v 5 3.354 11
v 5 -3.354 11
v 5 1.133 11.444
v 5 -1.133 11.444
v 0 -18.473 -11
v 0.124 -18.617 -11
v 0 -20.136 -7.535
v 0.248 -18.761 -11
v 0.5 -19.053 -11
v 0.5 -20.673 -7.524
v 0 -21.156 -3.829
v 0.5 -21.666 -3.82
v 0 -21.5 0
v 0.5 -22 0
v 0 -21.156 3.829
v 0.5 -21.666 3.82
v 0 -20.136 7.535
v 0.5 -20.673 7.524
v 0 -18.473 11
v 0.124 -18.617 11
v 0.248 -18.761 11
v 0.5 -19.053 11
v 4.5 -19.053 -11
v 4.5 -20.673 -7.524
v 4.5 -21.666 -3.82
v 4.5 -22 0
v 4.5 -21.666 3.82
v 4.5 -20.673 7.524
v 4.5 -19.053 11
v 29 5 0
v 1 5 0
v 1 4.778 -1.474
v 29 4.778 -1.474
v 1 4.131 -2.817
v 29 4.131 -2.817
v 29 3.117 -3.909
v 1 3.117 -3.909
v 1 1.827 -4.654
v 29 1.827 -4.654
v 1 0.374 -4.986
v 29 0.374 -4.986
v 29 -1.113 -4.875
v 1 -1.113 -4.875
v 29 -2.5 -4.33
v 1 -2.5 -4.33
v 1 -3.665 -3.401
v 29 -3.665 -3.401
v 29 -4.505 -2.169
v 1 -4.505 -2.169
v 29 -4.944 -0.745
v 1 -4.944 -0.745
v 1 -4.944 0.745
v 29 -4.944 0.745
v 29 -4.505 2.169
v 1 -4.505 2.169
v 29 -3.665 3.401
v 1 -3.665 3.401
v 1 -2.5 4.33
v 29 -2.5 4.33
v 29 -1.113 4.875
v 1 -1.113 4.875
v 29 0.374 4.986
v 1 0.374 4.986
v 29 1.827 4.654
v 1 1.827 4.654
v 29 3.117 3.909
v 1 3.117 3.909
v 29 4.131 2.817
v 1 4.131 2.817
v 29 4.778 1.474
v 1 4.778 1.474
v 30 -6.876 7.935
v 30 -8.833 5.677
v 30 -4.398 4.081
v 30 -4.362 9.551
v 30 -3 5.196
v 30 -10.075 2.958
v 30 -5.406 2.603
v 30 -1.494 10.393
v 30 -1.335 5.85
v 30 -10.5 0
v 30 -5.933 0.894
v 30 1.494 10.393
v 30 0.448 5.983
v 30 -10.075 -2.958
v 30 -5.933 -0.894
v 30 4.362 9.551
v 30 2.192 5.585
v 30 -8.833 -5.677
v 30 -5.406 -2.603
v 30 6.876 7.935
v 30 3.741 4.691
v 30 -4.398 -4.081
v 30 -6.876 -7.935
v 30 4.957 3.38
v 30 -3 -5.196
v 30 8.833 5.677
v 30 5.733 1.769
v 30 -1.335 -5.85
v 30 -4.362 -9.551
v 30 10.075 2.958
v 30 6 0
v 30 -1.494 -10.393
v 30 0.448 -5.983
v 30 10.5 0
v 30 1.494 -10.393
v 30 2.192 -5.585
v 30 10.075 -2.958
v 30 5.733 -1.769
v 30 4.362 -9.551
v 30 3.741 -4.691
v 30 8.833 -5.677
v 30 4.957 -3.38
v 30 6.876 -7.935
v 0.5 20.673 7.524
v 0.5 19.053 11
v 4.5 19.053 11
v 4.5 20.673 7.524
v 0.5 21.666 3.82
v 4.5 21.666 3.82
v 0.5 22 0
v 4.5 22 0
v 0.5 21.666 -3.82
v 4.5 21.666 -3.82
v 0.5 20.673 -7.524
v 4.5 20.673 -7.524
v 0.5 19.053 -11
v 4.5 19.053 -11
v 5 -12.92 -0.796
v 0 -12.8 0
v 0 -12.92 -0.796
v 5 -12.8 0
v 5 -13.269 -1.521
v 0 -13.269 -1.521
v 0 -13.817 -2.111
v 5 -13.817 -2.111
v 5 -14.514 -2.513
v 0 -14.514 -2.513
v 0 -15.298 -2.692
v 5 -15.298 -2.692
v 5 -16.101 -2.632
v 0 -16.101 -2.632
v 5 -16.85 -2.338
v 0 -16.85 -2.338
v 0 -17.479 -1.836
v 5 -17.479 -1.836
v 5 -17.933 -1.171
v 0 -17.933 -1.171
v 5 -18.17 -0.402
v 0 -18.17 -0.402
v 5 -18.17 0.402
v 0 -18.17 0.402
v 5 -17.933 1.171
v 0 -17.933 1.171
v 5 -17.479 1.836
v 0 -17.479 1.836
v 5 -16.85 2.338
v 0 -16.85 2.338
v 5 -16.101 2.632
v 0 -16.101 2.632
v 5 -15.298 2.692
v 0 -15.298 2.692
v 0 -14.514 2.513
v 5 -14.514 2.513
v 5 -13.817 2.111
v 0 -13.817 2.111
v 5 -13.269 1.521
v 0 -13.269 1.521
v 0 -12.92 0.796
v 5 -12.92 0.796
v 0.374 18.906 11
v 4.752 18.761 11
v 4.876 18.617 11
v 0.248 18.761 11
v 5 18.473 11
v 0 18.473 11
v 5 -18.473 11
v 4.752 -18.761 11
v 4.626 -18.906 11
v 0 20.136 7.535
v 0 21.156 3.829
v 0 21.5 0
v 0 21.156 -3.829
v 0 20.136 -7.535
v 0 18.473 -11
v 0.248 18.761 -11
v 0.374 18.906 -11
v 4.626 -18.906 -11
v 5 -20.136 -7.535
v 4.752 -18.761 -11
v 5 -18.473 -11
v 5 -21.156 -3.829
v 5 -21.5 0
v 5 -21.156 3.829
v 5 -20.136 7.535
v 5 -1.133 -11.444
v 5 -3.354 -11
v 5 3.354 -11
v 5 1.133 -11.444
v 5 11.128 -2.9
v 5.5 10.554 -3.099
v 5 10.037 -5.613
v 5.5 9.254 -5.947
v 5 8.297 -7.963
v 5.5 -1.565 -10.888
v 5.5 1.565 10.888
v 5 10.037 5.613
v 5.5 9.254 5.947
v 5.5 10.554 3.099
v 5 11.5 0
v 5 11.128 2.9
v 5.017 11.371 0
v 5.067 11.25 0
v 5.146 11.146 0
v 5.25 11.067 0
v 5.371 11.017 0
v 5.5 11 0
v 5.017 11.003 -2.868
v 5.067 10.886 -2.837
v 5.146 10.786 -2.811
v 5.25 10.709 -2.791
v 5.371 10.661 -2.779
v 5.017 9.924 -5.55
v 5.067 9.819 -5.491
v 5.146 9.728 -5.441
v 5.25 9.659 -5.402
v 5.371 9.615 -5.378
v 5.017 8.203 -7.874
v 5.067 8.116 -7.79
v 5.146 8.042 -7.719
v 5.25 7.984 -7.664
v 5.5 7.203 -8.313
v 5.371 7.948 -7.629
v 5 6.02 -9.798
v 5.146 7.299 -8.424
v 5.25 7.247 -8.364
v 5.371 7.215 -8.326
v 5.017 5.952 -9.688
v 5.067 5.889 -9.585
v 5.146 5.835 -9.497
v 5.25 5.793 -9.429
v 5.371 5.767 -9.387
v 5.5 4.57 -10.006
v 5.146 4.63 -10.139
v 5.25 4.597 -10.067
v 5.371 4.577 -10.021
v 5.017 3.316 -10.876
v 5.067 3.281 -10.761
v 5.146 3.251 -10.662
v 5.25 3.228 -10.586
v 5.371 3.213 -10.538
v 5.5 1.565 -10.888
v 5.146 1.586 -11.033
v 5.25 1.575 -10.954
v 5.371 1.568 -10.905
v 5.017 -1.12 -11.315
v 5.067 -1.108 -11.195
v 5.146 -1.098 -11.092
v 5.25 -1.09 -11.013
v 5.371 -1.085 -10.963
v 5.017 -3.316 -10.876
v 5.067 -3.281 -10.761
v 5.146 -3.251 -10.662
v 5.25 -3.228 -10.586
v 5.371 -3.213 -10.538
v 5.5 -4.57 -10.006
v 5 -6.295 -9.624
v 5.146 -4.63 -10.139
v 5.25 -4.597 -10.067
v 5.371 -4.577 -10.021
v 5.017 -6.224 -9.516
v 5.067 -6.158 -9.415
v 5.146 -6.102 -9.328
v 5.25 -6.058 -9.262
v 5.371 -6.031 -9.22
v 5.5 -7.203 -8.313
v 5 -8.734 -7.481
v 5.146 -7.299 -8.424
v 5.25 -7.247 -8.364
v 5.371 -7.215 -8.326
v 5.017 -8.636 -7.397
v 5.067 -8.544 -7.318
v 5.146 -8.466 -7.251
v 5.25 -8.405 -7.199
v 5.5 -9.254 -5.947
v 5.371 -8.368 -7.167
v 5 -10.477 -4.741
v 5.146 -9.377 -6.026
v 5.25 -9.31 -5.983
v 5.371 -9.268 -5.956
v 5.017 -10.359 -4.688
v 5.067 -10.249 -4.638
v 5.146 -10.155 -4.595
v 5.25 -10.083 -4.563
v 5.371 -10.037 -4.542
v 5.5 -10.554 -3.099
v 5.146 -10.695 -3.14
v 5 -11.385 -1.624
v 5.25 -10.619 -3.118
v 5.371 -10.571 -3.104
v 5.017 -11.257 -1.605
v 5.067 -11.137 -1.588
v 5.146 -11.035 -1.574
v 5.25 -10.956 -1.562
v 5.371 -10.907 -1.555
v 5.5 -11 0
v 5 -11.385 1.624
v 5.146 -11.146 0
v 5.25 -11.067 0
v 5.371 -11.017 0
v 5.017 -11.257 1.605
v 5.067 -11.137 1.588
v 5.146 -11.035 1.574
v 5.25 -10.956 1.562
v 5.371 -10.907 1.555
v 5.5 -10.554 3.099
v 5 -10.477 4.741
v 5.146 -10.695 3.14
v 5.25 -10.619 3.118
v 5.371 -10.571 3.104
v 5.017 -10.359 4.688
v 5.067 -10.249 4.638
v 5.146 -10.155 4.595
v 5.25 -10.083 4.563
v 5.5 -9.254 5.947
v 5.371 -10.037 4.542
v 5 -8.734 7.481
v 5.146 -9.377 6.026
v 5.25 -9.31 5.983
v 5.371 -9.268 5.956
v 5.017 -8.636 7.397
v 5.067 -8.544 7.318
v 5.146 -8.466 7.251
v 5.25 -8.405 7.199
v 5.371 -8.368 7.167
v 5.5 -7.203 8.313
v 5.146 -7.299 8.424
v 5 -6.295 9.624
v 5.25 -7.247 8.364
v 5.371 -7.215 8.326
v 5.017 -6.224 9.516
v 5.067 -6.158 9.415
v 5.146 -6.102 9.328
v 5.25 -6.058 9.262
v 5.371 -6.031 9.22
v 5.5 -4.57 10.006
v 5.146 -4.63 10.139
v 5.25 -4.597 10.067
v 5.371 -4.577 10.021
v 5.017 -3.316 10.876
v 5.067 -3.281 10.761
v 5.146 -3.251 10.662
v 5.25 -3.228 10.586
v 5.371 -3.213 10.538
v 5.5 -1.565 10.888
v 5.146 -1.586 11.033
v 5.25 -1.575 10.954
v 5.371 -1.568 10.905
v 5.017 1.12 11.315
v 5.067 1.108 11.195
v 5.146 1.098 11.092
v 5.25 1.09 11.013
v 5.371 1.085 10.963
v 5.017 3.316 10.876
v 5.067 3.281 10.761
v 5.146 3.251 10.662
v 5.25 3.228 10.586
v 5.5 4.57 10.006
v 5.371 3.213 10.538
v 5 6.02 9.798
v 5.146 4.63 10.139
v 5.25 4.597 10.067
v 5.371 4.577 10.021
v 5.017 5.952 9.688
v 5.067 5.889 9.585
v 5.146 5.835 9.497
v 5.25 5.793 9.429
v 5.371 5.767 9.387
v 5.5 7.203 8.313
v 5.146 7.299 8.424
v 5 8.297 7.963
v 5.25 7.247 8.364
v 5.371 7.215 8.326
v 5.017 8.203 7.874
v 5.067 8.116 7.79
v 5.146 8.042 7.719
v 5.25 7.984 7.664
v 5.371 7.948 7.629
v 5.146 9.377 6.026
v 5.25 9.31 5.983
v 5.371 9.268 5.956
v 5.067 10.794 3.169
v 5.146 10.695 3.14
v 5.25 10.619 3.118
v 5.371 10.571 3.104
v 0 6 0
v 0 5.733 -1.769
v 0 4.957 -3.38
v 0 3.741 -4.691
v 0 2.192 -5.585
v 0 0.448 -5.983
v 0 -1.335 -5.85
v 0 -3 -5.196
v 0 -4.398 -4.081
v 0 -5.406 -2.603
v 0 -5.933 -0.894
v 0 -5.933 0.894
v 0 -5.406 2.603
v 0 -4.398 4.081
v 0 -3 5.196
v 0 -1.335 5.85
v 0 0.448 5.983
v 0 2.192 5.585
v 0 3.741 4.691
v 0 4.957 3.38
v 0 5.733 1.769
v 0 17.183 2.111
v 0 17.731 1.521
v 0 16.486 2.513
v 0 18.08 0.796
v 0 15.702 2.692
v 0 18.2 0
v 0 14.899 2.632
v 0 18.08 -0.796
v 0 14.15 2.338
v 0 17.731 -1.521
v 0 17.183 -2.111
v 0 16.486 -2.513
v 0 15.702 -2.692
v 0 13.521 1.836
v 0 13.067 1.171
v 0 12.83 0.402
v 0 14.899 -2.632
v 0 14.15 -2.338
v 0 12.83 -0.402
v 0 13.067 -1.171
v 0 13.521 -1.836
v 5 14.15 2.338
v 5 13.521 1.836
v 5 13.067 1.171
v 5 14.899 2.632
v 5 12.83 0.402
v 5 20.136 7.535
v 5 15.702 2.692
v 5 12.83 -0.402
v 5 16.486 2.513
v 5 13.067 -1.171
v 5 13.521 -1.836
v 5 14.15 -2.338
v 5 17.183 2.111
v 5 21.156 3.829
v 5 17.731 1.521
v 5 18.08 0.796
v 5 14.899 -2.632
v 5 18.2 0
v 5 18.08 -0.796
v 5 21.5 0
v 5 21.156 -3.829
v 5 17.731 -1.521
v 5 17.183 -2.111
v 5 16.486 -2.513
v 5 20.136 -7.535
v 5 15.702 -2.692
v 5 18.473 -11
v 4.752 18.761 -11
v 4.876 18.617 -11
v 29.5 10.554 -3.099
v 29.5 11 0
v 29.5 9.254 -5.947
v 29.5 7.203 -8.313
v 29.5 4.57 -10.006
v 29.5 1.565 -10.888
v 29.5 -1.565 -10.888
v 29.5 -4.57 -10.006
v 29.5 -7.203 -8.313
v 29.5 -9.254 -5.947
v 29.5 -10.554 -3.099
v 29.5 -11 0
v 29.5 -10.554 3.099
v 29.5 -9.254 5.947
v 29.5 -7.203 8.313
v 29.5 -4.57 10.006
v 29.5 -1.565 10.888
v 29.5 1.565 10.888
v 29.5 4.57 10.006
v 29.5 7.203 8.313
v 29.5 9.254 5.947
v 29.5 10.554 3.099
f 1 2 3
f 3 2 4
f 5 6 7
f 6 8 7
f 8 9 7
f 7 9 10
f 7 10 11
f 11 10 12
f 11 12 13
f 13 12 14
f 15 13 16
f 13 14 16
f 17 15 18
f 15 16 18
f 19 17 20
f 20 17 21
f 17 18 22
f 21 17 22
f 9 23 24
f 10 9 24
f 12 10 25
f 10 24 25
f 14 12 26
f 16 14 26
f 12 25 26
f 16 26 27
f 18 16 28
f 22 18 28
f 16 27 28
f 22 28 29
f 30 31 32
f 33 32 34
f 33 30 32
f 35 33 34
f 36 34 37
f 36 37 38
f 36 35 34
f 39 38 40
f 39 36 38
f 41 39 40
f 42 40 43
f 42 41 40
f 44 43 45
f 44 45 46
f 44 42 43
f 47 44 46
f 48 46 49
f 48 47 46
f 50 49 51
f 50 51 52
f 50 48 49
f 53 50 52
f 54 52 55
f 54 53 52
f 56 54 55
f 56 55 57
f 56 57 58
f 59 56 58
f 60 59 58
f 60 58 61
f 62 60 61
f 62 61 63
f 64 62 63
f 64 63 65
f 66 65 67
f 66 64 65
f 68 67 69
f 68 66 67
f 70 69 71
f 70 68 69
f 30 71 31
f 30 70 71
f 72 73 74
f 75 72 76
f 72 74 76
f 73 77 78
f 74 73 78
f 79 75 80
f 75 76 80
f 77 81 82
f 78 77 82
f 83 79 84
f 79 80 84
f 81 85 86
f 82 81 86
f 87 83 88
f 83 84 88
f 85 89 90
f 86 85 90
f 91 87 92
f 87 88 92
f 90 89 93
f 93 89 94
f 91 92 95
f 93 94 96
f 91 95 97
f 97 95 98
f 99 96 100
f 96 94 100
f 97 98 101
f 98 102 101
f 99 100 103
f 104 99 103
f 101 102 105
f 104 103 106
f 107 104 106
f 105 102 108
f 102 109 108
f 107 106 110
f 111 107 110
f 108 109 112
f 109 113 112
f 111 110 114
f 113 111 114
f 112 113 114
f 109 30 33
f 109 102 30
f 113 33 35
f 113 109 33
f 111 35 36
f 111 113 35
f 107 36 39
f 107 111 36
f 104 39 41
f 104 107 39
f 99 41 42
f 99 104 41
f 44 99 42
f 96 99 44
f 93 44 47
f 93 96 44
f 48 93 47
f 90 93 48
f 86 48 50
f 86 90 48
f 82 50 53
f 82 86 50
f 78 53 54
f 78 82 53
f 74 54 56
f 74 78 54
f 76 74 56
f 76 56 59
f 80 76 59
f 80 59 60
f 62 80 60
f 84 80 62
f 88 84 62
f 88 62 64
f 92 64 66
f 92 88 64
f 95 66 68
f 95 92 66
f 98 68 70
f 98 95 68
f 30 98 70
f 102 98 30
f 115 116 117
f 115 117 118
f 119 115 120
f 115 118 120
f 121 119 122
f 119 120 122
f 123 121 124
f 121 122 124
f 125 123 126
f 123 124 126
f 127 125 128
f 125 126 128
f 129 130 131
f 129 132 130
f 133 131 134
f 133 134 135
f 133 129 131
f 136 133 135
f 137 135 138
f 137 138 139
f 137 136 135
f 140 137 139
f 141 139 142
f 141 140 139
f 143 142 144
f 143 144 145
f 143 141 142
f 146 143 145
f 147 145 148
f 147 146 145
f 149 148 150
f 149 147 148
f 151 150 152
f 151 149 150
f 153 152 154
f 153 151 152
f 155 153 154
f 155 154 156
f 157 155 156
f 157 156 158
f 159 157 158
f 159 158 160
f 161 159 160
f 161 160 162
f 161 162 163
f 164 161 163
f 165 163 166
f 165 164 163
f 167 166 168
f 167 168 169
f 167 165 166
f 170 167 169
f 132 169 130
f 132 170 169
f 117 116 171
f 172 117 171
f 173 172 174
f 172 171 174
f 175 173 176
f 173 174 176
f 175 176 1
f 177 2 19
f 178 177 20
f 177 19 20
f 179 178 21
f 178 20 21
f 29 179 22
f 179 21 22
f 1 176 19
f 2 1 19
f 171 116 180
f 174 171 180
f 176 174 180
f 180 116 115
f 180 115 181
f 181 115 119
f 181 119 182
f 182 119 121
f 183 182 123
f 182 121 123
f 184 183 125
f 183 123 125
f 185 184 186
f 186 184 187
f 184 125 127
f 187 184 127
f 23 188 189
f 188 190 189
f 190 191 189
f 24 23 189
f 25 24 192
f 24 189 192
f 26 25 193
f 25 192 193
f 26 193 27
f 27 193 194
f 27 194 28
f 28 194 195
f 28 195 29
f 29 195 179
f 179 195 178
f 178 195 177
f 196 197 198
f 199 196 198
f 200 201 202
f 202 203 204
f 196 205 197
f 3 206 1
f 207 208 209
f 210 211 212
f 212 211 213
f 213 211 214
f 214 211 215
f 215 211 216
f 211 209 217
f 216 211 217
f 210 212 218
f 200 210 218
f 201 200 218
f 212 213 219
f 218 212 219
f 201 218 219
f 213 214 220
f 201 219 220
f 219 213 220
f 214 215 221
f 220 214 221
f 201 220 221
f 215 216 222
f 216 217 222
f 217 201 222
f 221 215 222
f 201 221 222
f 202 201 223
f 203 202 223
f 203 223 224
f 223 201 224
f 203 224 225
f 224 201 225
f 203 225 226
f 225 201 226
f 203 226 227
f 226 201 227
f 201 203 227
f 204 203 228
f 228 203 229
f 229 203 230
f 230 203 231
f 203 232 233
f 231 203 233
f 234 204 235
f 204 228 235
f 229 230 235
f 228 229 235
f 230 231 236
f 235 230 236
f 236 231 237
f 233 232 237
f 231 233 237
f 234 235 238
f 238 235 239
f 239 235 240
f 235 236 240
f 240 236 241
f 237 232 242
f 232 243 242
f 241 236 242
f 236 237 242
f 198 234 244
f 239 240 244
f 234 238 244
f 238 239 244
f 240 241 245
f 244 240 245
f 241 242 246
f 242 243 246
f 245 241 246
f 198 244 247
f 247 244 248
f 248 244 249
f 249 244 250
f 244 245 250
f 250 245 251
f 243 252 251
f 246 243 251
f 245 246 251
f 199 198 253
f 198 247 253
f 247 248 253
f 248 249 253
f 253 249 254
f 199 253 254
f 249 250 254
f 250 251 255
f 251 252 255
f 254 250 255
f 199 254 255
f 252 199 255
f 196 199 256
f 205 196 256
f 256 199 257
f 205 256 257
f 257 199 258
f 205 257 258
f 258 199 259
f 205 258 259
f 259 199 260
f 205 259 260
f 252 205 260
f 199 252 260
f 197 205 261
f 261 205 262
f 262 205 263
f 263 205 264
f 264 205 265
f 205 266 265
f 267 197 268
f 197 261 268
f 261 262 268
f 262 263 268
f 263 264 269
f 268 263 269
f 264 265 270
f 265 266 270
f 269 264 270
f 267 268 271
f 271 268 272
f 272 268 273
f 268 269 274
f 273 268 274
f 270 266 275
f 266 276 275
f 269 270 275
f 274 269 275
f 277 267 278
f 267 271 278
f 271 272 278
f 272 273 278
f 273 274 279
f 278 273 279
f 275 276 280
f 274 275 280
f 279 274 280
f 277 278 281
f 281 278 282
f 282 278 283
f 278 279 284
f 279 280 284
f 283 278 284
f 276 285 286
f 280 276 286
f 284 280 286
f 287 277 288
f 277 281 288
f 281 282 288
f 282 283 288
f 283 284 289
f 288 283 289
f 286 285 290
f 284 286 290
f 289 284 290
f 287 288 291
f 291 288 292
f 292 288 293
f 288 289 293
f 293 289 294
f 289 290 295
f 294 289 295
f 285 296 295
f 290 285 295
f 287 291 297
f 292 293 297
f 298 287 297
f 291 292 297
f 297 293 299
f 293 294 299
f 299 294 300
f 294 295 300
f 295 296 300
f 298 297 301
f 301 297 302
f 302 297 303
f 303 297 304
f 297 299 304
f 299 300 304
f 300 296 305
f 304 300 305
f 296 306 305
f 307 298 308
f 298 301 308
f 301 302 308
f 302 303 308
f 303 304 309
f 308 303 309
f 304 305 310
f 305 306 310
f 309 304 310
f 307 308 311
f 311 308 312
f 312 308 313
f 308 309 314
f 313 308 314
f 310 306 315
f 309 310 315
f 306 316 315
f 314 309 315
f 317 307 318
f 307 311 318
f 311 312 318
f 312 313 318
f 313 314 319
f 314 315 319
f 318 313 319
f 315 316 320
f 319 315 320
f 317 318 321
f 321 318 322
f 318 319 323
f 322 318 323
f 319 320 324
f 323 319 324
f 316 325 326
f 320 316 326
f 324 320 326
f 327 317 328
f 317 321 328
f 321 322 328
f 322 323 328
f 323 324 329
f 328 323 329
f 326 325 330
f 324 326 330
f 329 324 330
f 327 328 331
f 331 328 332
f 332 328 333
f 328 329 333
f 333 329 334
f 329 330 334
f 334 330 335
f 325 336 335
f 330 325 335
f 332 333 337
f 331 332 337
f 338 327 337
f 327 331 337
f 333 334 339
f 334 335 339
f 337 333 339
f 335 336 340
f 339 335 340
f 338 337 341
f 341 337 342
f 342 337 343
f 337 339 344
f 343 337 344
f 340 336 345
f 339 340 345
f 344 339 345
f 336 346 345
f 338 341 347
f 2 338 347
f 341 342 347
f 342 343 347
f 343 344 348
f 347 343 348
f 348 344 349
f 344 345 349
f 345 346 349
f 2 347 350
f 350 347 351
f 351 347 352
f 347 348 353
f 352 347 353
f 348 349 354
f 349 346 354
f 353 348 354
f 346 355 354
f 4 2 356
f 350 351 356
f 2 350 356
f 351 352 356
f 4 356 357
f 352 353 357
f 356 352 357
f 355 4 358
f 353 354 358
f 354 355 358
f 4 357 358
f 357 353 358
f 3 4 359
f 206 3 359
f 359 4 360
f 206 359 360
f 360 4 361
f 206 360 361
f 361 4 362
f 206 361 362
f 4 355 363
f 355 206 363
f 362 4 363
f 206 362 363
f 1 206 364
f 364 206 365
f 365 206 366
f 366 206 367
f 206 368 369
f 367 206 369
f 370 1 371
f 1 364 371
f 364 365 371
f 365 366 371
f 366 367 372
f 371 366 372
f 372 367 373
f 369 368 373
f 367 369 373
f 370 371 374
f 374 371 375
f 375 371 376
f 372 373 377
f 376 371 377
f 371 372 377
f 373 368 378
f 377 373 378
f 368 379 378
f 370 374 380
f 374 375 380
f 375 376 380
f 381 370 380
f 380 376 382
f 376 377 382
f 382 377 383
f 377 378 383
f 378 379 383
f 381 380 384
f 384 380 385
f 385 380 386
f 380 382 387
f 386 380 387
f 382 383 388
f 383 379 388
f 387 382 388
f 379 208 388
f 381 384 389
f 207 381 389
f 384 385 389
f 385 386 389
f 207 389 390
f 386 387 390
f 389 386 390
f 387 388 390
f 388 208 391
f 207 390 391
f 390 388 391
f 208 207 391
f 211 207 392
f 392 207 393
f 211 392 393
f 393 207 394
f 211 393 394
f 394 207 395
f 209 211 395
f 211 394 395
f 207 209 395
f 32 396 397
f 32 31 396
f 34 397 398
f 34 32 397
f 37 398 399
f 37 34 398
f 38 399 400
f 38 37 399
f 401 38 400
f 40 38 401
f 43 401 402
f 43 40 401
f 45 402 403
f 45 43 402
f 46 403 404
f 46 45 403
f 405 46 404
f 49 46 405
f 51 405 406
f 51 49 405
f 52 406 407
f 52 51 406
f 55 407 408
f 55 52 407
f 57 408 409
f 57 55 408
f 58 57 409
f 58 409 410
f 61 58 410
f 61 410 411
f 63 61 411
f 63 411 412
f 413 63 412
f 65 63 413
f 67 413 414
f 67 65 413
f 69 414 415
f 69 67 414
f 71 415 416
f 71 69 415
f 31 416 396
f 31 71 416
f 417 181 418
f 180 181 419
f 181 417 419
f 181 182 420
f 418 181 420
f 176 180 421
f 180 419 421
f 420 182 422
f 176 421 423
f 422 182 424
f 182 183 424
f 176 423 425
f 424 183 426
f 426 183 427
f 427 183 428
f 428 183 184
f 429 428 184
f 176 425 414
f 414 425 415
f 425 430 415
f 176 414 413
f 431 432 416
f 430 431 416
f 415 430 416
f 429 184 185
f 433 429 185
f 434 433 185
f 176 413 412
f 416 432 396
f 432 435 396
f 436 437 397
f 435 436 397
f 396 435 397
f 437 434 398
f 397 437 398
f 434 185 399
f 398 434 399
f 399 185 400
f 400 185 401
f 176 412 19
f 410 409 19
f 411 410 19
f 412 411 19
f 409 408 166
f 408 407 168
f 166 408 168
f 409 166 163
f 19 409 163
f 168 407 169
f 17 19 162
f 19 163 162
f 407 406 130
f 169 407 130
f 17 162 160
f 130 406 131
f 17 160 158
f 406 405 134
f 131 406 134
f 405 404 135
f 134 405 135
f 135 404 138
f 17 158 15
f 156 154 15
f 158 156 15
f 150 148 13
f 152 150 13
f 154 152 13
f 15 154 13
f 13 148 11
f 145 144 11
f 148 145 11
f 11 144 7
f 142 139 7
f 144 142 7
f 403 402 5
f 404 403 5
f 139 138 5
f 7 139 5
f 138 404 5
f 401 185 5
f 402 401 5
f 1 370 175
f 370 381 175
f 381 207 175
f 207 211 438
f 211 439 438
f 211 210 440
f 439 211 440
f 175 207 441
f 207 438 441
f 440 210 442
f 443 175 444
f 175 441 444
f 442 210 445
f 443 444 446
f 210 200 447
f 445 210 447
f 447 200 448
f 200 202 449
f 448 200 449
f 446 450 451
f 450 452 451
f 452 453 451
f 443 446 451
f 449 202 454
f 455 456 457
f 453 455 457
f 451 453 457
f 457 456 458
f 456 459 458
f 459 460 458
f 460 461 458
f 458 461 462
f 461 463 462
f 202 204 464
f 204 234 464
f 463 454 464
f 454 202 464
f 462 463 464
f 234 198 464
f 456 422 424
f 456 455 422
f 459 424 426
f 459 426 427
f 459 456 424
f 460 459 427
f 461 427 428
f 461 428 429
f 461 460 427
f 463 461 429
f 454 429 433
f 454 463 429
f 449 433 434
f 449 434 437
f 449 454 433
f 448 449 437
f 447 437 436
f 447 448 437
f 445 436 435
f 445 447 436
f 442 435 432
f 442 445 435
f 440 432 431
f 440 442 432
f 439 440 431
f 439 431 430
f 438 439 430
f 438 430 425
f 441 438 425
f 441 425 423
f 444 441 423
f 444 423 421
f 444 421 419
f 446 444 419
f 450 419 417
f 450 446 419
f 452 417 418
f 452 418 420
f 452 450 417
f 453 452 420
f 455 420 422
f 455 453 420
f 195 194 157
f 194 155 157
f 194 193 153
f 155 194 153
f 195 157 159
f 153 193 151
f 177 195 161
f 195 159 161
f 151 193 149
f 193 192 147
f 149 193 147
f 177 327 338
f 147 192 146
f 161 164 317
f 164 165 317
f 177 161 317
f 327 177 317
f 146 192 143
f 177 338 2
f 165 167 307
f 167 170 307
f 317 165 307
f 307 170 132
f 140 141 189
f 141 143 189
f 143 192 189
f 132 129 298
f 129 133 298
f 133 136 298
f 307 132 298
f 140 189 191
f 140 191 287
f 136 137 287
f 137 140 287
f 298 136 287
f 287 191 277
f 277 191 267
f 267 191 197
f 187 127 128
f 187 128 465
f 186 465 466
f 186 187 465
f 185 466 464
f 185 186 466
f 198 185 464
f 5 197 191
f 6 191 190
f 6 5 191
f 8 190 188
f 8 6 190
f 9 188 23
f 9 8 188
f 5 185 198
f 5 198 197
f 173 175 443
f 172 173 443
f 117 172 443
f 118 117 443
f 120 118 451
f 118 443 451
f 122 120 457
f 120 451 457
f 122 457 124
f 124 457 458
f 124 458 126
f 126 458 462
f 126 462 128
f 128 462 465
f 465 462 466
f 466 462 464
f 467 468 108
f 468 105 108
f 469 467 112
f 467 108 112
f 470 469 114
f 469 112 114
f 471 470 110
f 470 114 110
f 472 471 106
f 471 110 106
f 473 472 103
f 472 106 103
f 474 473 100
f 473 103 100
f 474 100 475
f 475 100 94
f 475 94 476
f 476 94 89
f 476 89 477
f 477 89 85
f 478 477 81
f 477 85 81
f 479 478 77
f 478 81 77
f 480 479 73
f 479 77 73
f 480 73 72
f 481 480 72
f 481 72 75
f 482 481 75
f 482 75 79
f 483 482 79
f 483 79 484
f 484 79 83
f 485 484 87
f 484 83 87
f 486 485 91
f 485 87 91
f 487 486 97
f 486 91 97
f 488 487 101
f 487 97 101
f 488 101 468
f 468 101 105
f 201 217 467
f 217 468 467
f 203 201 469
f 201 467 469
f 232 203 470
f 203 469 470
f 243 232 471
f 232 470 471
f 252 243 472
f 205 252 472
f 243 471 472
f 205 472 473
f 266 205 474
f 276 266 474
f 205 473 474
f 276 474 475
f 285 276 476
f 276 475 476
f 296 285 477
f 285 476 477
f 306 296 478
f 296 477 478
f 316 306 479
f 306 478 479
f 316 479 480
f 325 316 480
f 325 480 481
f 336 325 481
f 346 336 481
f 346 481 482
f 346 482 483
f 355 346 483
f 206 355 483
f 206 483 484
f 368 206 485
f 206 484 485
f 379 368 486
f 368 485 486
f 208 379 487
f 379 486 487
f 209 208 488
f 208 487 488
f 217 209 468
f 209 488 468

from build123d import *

# Parameters (mm, degrees)
SKETCH3_W          = 5
SKETCH3_H          = 2.7
SKETCH4_W          = 5
SKETCH4_H          = 2.7
SKETCH5_W          = 5
SKETCH5_H          = 2.7
SKETCH6_W          = 5
SKETCH6_H          = 2.7
CUT_EXTRUDE1_DEPTH = 5


with BuildPart() as part:
    # Sketch1 → Revolve1 (revolve)
    with BuildSketch(Plane.XY):
        with BuildLine():
            Line((0, 0), (0, 21.5))
            Line((0, 21.5), (0.5, 22))
            Line((0.5, 22), (4.5, 22))
            Line((4.5, 22), (5, 21.5))
            Line((5, 21.5), (5, 11.5))
            ThreePointArc((5, 11.5), (5.146446609, 11.146446609), (5.5, 11))
            Line((5.5, 11), (29.5, 11))
            Line((29.5, 11), (30, 10.5))
            Line((30, 10.5), (30, 0))
            Line((30, 0), (0, 0))
        make_face()
    revolve(axis=Axis((30, 0, 0), (-1, 0, 0)))

    # Sketch2 → Cut-Revolve1 (revolve, cut)
    with BuildSketch(Plane.XY):
        Polygon((0, 0), (0, 6), (1, 5), (29, 5), (30, 6), (30, 0), align=None)
    revolve(axis=Axis((30, 0, 0), (-1, 0, 0)), mode=Mode.SUBTRACT)

    # Sketch3 → Cut-Revolve2 (revolve, cut)
    with BuildSketch(Plane.XY):
        with Locations((2.5, 16.85)):
            Rectangle(SKETCH3_W, SKETCH3_H)
    revolve(axis=Axis((5, 15.5, 0), (-1, 0, 0)), mode=Mode.SUBTRACT)

    # Sketch4 → Cut-Revolve3 (revolve, cut)
    with BuildSketch(Plane.XY.offset(15.5)):
        with Locations((2.5, 1.35)):
            Rectangle(SKETCH4_W, SKETCH4_H)
    revolve(axis=Axis((5, 0, 15.5), (-1, 0, 0)), mode=Mode.SUBTRACT)

    # Sketch5 → Cut-Revolve4 (revolve, cut)
    with BuildSketch(Plane.XY):
        with Locations((2.5, -14.15)):
            Rectangle(SKETCH5_W, SKETCH5_H)
    revolve(axis=Axis((5, -15.5, 0), (-1, 0, 0)), mode=Mode.SUBTRACT)

    # Sketch6 → Cut-Revolve5 (revolve, cut)
    with BuildSketch(Plane.XY.offset(-15.5)):
        with Locations((2.5, 1.35)):
            Rectangle(SKETCH6_W, SKETCH6_H)
    revolve(axis=Axis((5, 0, -15.5), (-1, 0, 0)), mode=Mode.SUBTRACT)

    # Sketch7 → Cut-Extrude1 (cut)
    with BuildSketch(Plane.ZY):
        with BuildLine():
            Line((11, 19.052558883), (11, -19.052558883))
            ThreePointArc((11, -19.052558883), (22, 0), (11, 19.052558883))
        make_face()
        with BuildLine():
            Line((-11, 19.052558883), (-11, -19.052558883))
            ThreePointArc((-11, -19.052558883), (-22, 0), (-11, 19.052558883))
        make_face()
    extrude(amount=-CUT_EXTRUDE1_DEPTH, mode=Mode.SUBTRACT)


solid = part.part
